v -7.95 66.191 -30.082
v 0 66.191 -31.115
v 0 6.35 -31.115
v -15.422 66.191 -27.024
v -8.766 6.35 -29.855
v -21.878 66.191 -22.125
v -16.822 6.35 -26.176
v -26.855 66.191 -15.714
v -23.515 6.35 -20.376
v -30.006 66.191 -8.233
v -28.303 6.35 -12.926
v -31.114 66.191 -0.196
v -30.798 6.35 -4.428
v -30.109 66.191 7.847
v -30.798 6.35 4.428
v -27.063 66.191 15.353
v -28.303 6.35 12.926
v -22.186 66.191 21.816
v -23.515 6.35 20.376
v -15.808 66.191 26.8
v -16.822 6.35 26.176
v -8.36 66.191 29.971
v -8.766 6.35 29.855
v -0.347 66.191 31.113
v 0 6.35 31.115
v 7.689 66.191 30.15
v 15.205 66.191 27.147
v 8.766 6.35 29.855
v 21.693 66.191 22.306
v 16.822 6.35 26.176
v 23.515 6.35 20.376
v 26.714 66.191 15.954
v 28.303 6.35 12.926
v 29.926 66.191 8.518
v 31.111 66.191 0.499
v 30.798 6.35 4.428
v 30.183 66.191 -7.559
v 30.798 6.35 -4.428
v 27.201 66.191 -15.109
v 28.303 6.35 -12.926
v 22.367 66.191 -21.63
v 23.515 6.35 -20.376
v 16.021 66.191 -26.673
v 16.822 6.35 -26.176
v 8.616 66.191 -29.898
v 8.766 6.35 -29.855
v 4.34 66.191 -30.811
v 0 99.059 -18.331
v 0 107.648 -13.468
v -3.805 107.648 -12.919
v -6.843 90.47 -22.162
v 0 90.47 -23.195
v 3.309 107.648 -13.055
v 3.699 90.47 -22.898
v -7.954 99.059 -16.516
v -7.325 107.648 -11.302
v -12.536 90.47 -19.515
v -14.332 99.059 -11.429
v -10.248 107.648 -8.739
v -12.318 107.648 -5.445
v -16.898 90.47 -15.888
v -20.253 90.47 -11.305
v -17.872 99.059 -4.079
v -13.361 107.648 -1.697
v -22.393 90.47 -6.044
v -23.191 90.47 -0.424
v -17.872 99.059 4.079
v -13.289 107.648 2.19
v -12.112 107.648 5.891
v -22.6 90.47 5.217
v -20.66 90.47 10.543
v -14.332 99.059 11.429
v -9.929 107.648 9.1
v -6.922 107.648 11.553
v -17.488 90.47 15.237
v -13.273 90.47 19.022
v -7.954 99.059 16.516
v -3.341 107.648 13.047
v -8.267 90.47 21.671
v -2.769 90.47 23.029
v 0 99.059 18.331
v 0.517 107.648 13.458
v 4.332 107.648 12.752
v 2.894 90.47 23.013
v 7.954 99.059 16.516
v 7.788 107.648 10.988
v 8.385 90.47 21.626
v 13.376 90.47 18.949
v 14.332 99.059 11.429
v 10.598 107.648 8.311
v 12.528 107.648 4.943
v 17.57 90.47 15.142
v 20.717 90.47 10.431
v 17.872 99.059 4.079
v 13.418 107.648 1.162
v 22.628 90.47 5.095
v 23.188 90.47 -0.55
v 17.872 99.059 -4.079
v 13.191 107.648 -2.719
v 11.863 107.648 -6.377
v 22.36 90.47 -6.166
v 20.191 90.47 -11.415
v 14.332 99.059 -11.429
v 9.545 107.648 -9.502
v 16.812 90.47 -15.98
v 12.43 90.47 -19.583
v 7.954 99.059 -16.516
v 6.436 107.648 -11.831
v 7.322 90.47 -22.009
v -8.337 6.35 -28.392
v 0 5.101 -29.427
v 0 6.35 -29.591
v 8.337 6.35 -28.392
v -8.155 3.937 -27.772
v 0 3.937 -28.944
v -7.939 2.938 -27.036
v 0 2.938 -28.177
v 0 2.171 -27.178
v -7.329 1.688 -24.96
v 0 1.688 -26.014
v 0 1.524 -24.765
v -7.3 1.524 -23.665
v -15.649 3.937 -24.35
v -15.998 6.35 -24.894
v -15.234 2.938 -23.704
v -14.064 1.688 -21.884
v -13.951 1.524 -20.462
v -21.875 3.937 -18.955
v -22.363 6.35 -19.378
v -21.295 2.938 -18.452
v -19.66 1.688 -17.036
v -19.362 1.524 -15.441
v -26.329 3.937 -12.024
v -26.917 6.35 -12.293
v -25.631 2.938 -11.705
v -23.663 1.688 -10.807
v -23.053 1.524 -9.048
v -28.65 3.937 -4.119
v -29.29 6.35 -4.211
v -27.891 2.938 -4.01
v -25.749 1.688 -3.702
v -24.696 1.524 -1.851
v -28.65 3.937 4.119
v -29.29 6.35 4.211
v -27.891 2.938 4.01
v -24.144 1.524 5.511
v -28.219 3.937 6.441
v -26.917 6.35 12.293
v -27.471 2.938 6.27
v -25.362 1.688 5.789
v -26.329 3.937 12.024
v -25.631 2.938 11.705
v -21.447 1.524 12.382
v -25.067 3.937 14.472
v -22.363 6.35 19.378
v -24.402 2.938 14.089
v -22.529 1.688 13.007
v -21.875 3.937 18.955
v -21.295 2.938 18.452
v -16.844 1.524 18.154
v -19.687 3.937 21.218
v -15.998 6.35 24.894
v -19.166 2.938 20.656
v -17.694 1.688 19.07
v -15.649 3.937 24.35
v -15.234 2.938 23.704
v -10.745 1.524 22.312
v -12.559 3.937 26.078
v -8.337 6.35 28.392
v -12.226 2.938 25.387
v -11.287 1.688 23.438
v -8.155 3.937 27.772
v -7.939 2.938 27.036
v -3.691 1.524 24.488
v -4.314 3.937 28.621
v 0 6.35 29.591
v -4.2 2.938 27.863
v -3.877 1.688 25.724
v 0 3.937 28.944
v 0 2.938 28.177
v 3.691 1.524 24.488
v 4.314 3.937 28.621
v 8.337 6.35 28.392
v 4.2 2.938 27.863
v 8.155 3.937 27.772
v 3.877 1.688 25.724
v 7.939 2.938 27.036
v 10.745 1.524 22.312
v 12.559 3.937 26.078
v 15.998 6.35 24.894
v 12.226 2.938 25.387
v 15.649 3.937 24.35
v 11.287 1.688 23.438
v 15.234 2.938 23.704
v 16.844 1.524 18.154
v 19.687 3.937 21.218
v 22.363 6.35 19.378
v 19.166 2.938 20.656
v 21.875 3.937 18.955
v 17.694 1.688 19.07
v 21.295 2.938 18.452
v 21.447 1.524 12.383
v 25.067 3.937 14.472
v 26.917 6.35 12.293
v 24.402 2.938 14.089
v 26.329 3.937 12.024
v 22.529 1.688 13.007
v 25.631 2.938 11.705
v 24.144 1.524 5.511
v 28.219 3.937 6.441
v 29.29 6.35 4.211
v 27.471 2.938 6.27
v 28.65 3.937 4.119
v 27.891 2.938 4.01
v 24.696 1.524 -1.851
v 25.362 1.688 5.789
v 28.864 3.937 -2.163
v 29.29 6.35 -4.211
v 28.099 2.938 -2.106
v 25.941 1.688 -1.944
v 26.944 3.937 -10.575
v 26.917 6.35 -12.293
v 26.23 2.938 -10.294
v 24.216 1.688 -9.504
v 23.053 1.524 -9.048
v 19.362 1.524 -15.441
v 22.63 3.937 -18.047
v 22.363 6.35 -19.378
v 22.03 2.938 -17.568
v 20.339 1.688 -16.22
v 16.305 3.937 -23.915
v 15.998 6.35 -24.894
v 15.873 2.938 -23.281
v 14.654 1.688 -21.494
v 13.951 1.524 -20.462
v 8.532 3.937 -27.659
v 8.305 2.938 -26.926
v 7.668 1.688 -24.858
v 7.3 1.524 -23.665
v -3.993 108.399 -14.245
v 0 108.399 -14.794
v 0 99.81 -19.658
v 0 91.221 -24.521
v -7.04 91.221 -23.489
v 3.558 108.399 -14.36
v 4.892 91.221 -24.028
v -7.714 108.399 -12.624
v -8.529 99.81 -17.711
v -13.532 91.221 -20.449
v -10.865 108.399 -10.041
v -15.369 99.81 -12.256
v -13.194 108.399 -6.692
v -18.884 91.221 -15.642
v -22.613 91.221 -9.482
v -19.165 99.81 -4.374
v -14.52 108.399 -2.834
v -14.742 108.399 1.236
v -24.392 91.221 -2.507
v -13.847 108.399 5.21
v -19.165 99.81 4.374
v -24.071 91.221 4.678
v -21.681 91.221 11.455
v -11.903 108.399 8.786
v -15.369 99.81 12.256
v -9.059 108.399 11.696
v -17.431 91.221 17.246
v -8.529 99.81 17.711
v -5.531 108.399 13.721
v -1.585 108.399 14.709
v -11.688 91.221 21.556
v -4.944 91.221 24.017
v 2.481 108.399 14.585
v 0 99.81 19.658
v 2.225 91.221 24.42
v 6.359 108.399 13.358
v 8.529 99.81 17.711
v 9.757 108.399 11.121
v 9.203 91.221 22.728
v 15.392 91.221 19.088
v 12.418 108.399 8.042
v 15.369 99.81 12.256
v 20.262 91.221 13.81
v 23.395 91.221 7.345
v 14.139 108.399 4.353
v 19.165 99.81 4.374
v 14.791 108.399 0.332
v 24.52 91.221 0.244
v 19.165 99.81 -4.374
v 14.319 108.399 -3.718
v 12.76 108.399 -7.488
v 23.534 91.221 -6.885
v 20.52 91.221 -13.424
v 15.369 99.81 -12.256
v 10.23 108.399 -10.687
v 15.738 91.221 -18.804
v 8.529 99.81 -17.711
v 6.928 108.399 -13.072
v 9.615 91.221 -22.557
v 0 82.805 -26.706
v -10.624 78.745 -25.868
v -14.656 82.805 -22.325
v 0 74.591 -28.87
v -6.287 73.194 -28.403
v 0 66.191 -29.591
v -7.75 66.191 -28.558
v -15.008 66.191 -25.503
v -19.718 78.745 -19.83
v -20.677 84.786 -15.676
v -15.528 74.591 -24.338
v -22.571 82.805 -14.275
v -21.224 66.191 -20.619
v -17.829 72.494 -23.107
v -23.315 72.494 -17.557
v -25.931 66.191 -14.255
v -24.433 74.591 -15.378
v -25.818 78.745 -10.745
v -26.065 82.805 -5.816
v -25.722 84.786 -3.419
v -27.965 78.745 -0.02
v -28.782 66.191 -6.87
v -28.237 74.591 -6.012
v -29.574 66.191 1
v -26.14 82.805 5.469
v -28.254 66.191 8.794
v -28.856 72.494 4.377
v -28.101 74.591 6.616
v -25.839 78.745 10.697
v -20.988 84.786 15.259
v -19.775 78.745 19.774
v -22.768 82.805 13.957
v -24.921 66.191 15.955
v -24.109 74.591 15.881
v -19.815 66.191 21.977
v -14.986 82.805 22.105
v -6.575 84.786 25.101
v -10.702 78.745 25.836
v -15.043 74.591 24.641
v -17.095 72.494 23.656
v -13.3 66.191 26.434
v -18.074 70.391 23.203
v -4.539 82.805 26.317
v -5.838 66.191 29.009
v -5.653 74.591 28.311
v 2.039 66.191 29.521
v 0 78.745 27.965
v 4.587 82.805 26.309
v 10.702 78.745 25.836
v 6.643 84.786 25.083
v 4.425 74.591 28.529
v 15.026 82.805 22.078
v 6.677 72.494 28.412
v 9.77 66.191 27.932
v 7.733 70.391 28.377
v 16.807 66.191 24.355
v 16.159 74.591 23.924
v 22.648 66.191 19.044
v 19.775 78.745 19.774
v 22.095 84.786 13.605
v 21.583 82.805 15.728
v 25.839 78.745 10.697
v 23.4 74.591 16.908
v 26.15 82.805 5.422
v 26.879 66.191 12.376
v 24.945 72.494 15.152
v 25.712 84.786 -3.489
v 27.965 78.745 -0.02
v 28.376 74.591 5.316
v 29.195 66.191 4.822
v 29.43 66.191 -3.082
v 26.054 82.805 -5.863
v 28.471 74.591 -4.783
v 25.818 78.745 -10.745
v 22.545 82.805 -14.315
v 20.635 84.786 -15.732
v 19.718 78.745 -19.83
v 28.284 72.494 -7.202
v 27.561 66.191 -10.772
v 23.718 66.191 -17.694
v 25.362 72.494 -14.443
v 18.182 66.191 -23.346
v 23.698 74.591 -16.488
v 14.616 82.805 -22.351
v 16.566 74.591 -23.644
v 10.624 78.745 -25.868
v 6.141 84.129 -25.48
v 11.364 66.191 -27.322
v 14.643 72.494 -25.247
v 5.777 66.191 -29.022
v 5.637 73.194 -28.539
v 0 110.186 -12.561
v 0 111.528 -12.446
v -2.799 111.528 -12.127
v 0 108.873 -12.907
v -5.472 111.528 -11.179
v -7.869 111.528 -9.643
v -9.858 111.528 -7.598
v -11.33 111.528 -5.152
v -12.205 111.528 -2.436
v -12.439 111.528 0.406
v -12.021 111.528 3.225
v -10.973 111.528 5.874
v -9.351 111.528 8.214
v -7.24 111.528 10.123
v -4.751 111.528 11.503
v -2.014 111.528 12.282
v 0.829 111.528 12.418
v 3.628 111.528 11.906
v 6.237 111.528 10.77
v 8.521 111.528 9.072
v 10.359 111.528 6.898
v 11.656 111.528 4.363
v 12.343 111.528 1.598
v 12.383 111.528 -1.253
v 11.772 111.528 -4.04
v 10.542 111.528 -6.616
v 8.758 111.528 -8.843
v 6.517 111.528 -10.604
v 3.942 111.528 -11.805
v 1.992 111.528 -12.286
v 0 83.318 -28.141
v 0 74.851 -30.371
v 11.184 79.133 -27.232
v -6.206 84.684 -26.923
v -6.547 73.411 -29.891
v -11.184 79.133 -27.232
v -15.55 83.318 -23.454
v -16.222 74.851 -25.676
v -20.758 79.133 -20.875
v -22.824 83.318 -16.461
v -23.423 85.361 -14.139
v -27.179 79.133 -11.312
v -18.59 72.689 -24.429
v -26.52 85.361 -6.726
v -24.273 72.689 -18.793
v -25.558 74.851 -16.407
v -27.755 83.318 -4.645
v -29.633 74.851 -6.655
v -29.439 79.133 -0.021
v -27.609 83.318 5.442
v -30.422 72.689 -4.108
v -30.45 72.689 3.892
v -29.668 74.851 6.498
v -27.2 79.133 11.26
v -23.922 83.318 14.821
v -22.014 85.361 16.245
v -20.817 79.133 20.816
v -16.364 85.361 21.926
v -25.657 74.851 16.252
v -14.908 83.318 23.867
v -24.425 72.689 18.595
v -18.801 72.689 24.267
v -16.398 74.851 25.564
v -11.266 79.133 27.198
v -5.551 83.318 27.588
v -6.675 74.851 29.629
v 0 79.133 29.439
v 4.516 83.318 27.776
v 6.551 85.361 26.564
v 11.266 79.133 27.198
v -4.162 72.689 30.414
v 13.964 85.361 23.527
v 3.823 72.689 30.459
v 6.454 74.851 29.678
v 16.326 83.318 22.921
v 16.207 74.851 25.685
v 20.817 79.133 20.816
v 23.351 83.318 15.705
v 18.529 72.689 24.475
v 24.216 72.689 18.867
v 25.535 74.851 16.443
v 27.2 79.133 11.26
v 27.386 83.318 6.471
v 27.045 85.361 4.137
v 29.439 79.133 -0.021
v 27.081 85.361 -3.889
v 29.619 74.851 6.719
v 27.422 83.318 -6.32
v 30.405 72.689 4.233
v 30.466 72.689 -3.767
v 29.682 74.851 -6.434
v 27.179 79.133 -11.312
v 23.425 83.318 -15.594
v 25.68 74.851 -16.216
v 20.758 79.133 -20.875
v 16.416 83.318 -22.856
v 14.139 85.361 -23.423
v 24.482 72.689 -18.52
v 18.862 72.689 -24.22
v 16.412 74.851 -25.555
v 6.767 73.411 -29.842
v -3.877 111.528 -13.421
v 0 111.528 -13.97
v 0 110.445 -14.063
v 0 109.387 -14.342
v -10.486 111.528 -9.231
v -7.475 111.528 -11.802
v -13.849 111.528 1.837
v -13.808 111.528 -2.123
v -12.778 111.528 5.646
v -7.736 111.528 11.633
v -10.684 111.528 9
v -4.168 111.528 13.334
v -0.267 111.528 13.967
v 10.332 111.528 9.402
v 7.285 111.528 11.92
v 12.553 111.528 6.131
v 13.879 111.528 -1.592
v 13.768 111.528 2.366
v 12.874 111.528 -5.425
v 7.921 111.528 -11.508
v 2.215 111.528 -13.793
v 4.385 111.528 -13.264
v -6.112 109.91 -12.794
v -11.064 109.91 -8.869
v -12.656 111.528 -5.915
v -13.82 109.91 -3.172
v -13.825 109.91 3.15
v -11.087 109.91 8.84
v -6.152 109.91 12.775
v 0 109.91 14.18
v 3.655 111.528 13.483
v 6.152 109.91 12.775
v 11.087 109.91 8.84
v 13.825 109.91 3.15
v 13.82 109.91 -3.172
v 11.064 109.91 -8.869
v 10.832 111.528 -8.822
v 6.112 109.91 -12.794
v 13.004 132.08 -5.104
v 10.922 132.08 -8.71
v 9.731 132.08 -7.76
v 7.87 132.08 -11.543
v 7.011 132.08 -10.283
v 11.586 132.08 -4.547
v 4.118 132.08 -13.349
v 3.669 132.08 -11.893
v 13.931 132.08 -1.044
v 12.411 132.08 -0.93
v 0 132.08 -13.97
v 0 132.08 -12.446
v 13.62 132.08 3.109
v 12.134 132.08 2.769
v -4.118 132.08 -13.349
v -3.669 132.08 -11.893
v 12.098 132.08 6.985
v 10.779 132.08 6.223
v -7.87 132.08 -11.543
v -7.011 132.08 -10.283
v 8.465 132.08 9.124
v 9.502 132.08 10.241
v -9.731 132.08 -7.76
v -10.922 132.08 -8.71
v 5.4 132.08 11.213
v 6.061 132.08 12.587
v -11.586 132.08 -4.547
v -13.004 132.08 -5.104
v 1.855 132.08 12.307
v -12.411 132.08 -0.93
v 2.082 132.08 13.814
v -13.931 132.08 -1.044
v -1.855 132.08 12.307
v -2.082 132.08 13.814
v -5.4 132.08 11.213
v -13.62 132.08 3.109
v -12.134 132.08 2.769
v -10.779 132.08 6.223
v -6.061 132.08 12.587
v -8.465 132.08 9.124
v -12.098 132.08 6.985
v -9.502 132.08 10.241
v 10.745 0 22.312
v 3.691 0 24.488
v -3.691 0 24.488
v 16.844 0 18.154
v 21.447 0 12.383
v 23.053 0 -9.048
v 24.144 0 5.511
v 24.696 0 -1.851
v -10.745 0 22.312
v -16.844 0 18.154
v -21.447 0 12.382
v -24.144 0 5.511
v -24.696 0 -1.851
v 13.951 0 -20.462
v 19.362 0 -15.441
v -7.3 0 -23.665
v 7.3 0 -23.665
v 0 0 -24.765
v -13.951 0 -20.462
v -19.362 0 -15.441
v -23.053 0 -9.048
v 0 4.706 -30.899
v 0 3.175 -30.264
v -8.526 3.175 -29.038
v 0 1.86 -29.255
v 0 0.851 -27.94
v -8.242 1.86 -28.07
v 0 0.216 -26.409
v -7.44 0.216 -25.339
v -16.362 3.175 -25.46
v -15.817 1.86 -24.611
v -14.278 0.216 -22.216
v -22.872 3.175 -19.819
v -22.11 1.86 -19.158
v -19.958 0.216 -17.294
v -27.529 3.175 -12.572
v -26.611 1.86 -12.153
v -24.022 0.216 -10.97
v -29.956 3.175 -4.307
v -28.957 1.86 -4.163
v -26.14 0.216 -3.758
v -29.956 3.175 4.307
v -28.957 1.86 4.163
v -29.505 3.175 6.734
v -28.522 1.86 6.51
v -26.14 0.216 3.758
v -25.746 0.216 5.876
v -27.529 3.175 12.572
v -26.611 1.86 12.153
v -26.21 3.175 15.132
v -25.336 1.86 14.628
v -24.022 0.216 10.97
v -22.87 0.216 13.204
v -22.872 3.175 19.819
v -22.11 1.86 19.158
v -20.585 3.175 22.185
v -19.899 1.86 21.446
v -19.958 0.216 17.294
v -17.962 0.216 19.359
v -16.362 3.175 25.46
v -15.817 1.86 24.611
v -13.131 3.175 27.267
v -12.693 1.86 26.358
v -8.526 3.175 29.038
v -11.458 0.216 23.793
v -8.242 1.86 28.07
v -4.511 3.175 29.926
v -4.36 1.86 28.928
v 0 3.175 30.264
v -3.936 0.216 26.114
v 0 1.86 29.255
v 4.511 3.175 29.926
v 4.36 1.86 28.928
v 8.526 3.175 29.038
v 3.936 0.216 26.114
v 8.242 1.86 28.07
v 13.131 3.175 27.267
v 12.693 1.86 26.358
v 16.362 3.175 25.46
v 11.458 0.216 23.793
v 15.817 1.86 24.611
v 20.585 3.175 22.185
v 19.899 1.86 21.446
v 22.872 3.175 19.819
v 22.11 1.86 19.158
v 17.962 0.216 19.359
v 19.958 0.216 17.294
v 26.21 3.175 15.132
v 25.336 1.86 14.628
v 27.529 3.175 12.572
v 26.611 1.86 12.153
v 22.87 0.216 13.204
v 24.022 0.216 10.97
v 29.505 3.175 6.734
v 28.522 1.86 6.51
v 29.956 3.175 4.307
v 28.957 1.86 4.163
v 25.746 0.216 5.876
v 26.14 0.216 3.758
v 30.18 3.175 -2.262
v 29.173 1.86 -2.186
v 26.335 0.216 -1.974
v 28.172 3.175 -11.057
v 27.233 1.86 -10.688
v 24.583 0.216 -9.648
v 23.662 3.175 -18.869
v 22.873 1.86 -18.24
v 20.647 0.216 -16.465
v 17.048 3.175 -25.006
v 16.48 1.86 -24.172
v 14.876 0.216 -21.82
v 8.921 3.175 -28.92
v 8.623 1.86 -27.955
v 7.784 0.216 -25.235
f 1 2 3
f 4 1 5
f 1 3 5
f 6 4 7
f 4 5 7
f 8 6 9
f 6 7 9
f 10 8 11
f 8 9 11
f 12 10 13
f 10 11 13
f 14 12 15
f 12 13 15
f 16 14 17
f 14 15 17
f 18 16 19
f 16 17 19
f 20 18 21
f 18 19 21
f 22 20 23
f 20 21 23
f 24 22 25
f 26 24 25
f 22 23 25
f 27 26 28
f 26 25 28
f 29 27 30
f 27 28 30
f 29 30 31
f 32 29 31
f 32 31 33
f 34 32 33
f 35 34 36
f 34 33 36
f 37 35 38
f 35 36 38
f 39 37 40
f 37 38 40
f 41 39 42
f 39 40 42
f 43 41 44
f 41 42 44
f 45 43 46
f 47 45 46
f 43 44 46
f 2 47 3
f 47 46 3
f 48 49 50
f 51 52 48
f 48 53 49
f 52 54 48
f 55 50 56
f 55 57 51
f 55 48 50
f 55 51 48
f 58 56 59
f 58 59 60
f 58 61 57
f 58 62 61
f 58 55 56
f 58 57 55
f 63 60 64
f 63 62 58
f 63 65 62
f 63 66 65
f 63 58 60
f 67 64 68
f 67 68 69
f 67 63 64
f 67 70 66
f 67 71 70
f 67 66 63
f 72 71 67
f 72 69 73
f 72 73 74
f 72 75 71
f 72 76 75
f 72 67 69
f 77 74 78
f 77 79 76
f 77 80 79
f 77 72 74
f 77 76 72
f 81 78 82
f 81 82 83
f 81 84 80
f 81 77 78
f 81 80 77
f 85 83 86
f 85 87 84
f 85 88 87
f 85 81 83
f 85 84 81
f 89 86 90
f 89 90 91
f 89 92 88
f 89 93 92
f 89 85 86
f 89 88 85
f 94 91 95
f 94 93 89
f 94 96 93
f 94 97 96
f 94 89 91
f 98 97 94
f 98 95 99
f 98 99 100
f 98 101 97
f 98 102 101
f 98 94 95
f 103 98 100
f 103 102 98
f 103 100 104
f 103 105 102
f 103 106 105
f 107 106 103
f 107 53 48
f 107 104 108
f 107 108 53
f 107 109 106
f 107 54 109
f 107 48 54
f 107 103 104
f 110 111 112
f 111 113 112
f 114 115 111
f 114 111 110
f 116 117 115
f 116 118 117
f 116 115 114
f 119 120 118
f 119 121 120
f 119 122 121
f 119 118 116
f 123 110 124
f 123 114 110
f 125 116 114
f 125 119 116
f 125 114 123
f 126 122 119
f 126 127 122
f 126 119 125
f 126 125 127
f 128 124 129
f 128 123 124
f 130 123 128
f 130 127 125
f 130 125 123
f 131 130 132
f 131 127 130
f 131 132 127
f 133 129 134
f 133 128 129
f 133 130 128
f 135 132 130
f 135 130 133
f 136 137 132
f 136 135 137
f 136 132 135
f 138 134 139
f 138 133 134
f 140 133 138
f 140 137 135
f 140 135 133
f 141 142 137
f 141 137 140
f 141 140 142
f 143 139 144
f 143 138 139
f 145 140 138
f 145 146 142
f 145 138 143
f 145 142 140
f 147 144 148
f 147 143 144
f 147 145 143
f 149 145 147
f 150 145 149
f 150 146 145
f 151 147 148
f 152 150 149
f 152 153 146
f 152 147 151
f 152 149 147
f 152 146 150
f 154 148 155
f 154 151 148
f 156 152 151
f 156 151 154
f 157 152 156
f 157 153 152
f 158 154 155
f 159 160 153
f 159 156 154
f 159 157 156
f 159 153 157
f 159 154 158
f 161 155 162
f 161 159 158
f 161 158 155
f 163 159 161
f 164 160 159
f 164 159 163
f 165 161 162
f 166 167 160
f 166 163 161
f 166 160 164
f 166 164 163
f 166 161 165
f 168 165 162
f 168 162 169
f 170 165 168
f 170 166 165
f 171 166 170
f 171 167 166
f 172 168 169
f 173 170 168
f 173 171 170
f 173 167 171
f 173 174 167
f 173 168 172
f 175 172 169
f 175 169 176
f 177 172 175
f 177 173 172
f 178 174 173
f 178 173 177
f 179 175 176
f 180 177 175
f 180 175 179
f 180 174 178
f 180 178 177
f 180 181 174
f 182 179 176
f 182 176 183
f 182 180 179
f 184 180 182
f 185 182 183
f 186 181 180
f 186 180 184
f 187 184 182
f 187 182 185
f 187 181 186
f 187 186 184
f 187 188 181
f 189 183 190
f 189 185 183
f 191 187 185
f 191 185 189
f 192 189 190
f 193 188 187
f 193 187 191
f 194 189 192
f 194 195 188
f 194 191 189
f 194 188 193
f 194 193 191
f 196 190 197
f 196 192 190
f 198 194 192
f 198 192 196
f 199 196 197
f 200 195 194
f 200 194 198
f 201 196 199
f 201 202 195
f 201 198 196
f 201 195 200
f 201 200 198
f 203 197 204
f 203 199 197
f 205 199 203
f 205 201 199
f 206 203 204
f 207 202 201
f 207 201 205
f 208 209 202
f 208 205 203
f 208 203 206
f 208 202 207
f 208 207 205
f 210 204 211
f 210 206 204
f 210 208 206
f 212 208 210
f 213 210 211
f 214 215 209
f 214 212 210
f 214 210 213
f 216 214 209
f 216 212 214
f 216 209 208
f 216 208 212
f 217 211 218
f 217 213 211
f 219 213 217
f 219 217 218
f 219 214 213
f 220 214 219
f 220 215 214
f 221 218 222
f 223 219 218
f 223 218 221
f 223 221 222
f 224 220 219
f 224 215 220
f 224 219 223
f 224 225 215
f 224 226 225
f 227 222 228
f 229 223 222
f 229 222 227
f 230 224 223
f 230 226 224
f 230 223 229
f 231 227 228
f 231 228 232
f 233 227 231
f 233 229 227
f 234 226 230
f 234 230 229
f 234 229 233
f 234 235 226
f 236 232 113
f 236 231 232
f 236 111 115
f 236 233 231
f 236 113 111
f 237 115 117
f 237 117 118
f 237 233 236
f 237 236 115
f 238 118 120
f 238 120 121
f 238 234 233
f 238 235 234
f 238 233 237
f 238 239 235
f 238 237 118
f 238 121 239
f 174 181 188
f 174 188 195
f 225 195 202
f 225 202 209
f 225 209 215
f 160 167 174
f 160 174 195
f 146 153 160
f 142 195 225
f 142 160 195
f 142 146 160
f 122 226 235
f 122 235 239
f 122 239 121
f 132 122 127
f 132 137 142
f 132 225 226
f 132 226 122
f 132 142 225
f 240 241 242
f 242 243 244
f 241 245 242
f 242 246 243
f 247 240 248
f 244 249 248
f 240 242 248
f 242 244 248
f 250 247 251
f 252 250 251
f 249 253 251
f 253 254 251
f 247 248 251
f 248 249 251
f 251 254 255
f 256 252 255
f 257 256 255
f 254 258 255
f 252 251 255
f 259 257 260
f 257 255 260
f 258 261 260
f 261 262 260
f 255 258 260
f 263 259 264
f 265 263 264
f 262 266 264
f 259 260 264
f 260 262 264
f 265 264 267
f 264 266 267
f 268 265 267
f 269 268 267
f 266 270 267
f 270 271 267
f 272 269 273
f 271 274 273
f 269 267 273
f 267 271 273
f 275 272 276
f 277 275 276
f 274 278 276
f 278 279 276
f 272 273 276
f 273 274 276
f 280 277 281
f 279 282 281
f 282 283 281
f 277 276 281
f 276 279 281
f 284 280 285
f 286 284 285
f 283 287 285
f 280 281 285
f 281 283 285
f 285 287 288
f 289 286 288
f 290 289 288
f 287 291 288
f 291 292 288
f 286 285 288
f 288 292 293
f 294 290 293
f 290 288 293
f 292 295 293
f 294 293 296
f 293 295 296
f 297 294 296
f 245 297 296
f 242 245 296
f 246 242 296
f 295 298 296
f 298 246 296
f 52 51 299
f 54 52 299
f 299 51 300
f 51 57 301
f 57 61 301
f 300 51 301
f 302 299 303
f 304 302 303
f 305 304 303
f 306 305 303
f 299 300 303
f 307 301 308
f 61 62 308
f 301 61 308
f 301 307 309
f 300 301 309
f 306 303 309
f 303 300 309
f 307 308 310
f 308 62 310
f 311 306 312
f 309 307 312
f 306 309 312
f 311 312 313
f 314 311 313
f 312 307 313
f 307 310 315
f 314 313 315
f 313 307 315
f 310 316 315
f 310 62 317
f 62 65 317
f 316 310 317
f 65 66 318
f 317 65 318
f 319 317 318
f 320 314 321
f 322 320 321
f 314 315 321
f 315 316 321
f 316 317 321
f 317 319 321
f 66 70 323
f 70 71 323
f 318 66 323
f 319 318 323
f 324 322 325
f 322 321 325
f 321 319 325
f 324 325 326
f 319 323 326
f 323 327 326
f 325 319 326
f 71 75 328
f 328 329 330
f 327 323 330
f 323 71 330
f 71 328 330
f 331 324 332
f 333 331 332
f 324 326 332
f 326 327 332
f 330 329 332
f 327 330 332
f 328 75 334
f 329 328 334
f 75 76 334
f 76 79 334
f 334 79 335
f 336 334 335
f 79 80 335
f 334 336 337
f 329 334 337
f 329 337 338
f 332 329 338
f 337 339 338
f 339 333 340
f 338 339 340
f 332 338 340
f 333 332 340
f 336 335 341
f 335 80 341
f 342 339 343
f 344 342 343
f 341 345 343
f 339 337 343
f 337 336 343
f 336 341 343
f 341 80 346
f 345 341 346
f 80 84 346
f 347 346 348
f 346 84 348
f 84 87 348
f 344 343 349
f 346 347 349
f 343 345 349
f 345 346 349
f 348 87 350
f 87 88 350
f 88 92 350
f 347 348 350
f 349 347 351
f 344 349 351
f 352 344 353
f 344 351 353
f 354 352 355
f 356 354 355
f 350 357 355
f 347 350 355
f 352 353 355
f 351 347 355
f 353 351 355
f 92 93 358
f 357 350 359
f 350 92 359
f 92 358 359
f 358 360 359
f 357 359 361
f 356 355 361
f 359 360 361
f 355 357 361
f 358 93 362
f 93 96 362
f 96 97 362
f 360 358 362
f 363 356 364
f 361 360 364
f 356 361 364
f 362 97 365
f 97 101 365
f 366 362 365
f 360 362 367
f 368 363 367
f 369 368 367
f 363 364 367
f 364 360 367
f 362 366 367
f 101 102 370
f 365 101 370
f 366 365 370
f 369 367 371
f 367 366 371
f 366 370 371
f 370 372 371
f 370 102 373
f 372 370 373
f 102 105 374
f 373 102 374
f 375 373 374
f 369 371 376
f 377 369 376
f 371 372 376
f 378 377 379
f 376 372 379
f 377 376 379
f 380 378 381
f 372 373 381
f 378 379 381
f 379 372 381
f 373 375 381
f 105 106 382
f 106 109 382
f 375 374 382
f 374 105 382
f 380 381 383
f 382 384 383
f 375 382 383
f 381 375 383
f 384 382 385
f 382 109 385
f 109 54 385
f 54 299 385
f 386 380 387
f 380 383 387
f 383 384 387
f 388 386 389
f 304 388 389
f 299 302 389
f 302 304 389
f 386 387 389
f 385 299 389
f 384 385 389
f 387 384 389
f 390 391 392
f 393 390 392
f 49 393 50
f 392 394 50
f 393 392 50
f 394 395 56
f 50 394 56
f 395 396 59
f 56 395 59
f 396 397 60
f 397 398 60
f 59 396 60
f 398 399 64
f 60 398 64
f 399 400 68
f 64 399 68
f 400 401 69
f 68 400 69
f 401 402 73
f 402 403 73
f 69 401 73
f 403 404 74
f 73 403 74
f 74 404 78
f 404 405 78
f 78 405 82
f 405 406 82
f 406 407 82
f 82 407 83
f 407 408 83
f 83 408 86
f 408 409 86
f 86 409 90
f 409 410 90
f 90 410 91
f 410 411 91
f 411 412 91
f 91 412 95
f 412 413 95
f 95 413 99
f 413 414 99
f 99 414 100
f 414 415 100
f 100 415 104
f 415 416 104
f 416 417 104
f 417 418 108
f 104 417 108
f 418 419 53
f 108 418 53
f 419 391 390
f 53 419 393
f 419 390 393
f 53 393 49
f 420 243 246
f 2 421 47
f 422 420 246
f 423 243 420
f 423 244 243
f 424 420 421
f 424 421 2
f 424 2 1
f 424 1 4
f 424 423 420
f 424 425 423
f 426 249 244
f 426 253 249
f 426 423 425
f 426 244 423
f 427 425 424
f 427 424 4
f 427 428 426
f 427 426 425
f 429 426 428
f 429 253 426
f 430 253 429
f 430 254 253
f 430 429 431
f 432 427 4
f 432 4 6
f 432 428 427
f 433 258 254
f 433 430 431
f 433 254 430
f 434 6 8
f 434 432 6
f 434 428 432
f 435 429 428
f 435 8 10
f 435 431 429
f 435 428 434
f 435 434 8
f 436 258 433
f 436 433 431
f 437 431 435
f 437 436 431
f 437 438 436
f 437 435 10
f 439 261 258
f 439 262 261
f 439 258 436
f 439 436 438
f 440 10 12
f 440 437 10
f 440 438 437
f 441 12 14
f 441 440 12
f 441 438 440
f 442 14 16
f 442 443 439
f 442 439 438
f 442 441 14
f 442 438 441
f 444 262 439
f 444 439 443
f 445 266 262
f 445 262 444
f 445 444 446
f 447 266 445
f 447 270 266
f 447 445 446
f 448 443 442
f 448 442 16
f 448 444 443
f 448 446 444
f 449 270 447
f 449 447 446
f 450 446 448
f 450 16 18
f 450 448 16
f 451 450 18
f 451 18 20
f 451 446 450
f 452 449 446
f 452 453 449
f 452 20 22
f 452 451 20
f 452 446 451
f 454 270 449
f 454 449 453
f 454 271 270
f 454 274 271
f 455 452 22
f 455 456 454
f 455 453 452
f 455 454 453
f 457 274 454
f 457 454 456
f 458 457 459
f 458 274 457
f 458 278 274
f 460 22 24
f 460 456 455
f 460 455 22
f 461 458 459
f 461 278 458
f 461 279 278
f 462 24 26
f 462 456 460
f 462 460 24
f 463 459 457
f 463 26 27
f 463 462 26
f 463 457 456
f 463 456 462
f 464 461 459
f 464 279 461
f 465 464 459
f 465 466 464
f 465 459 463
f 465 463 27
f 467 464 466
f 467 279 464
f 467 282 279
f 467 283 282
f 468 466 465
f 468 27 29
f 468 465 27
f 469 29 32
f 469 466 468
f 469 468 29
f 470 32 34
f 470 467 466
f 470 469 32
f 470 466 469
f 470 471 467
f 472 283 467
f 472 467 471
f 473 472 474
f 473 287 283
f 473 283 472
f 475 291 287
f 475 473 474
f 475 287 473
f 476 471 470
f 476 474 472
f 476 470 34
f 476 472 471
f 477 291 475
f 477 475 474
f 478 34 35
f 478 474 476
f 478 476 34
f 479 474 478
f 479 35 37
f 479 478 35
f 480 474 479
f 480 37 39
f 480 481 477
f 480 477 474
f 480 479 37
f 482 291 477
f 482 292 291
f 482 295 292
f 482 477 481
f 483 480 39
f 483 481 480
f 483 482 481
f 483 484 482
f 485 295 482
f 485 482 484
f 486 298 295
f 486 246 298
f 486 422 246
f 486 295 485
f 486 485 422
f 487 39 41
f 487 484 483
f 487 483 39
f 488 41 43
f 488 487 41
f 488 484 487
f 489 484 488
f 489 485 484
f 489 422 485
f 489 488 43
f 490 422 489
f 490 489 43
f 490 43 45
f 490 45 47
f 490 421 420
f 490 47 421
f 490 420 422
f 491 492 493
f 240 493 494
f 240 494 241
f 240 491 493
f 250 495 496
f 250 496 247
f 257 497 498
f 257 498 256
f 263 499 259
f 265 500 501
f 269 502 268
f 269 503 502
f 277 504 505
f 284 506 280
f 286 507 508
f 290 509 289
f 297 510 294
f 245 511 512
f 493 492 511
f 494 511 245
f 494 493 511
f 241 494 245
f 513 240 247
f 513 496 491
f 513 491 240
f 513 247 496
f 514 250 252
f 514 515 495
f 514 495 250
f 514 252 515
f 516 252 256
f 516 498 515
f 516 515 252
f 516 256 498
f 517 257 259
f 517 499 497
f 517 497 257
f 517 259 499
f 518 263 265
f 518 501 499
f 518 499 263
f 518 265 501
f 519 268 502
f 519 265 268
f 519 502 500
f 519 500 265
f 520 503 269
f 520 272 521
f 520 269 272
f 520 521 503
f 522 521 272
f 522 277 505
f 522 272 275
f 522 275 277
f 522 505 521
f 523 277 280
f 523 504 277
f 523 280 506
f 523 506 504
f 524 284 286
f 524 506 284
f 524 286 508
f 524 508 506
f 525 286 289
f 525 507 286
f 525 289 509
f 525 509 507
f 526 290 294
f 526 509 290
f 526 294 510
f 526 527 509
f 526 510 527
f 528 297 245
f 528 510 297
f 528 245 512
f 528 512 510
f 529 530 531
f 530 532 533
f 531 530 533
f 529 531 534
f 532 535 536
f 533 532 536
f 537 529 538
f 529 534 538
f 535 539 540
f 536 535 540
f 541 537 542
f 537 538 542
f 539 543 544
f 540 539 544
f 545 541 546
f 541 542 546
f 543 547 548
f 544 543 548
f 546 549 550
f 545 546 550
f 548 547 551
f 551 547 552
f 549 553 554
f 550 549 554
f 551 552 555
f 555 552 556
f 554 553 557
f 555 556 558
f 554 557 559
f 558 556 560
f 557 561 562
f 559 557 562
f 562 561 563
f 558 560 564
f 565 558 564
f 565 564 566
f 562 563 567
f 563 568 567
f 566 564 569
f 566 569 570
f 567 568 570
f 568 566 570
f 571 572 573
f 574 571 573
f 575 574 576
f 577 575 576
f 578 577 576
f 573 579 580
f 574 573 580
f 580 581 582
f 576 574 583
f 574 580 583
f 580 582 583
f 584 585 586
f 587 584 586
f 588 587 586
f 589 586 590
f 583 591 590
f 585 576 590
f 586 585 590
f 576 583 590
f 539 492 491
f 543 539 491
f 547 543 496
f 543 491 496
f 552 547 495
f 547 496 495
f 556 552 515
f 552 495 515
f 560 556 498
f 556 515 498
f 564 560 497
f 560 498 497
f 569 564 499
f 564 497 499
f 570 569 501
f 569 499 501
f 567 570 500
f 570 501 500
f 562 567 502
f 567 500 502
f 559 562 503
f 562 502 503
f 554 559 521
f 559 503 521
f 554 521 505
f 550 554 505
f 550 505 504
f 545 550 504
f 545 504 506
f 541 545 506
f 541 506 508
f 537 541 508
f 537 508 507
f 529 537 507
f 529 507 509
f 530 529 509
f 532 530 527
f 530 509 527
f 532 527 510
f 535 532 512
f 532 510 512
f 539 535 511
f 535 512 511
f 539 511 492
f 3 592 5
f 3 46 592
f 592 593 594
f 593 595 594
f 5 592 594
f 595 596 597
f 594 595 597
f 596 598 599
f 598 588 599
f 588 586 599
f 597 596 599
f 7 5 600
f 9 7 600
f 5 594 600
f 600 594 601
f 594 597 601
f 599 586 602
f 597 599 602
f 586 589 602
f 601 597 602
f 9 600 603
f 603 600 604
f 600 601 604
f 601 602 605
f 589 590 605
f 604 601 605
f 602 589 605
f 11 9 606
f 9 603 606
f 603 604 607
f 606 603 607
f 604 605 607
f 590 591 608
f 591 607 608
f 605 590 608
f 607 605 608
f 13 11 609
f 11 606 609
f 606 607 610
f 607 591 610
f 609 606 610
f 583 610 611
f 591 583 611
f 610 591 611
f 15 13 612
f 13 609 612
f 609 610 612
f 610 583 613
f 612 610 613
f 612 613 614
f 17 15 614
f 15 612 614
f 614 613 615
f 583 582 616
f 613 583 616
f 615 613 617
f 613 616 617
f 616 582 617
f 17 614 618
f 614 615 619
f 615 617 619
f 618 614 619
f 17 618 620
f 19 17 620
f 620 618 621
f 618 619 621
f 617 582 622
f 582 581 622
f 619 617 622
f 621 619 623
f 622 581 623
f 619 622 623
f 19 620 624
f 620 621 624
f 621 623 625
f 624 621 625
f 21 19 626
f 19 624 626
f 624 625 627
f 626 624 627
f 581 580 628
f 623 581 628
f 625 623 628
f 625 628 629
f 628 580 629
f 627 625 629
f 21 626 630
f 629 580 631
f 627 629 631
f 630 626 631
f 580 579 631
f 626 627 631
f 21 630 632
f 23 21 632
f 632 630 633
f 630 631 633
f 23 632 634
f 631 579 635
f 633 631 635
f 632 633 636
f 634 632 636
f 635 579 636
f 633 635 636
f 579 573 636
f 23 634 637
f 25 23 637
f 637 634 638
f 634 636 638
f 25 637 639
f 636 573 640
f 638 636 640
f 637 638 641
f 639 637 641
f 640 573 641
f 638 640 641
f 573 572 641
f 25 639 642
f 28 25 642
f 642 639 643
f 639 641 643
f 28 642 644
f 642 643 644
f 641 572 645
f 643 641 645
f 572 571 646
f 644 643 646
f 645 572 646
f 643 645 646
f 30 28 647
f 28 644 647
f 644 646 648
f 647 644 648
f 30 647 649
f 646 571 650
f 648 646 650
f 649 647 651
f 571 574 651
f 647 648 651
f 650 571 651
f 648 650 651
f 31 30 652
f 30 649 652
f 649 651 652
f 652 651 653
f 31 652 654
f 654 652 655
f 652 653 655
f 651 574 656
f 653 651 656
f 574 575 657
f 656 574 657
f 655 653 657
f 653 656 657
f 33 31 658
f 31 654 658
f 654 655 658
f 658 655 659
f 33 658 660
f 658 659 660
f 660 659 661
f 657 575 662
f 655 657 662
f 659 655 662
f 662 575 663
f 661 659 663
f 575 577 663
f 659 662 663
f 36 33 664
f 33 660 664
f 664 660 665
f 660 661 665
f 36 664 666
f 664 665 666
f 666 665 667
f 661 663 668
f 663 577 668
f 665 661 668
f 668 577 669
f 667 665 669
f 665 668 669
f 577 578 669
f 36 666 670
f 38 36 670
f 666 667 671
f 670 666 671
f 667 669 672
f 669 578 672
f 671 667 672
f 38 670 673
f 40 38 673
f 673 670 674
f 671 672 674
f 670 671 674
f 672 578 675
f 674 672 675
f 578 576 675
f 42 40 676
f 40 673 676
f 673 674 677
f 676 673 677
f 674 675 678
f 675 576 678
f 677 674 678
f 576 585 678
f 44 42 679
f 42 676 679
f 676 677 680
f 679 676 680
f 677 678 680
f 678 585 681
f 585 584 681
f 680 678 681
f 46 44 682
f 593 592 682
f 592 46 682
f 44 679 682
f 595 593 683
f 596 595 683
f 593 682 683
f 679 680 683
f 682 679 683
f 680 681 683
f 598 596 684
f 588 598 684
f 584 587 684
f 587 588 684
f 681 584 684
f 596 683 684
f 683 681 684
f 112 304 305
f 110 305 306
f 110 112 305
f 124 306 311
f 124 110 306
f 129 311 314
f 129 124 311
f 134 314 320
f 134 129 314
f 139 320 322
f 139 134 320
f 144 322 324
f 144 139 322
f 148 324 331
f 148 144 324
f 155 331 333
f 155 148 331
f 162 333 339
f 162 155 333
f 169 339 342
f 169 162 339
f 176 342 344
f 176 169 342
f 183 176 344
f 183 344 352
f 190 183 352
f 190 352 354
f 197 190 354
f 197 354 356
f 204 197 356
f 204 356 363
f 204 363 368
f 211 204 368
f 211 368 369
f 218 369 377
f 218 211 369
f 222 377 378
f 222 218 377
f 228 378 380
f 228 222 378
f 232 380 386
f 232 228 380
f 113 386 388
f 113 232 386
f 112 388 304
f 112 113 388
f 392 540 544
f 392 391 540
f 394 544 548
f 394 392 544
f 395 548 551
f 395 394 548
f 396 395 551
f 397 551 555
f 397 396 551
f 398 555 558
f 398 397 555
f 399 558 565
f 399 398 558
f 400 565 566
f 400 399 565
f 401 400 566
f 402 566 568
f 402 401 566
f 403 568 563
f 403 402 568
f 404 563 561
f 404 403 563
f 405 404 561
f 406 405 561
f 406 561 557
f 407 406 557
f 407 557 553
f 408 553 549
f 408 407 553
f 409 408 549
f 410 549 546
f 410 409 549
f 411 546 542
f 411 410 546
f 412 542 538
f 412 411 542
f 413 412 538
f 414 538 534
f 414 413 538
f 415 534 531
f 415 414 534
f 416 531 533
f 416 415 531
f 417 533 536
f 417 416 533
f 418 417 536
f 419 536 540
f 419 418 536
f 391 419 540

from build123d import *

# Parameters (mm, degrees)
FILLET1_R = 6.35
FILLET2_R = 50.8
SHELL1_T  = -1.524


with BuildPart() as part:
    # Sketch1 → Revolve1 (revolve)
    with BuildSketch(Plane.XY, mode=Mode.PRIVATE) as revolve1_sk:
        Polygon((0, 0), (0, 132.08), (-13.97, 132.08), (-13.97, 109.855), (-31.115, 79.574510135), (-31.115, 0), align=None)
    revolve(revolve1_sk.sketch.rotate(Axis((0, 0, 0), (0, 1, 0)), 270), axis=Axis((0, 0, 0), (0, 1, 0)))

    # Fillet1
    fillet1_edges = [part.edges().sort_by_distance(p)[0] for p in [
        (0, 109.855, 13.97),
        (0, 0, 31.115),
    ]]
    fillet(fillet1_edges, radius=FILLET1_R)

    # Fillet2
    fillet2_edges = [part.edges().sort_by_distance(p)[0] for p in [
        (0, 79.574510135, 31.115),
    ]]
    fillet(fillet2_edges, radius=FILLET2_R)

    # Shell1
    shell1_openings = [part.faces().sort_by_distance(p)[0] for p in [
        (0, 132.08, 0),
    ]]
    offset(amount=SHELL1_T, openings=shell1_openings, kind=Kind.INTERSECTION)


solid = part.part
